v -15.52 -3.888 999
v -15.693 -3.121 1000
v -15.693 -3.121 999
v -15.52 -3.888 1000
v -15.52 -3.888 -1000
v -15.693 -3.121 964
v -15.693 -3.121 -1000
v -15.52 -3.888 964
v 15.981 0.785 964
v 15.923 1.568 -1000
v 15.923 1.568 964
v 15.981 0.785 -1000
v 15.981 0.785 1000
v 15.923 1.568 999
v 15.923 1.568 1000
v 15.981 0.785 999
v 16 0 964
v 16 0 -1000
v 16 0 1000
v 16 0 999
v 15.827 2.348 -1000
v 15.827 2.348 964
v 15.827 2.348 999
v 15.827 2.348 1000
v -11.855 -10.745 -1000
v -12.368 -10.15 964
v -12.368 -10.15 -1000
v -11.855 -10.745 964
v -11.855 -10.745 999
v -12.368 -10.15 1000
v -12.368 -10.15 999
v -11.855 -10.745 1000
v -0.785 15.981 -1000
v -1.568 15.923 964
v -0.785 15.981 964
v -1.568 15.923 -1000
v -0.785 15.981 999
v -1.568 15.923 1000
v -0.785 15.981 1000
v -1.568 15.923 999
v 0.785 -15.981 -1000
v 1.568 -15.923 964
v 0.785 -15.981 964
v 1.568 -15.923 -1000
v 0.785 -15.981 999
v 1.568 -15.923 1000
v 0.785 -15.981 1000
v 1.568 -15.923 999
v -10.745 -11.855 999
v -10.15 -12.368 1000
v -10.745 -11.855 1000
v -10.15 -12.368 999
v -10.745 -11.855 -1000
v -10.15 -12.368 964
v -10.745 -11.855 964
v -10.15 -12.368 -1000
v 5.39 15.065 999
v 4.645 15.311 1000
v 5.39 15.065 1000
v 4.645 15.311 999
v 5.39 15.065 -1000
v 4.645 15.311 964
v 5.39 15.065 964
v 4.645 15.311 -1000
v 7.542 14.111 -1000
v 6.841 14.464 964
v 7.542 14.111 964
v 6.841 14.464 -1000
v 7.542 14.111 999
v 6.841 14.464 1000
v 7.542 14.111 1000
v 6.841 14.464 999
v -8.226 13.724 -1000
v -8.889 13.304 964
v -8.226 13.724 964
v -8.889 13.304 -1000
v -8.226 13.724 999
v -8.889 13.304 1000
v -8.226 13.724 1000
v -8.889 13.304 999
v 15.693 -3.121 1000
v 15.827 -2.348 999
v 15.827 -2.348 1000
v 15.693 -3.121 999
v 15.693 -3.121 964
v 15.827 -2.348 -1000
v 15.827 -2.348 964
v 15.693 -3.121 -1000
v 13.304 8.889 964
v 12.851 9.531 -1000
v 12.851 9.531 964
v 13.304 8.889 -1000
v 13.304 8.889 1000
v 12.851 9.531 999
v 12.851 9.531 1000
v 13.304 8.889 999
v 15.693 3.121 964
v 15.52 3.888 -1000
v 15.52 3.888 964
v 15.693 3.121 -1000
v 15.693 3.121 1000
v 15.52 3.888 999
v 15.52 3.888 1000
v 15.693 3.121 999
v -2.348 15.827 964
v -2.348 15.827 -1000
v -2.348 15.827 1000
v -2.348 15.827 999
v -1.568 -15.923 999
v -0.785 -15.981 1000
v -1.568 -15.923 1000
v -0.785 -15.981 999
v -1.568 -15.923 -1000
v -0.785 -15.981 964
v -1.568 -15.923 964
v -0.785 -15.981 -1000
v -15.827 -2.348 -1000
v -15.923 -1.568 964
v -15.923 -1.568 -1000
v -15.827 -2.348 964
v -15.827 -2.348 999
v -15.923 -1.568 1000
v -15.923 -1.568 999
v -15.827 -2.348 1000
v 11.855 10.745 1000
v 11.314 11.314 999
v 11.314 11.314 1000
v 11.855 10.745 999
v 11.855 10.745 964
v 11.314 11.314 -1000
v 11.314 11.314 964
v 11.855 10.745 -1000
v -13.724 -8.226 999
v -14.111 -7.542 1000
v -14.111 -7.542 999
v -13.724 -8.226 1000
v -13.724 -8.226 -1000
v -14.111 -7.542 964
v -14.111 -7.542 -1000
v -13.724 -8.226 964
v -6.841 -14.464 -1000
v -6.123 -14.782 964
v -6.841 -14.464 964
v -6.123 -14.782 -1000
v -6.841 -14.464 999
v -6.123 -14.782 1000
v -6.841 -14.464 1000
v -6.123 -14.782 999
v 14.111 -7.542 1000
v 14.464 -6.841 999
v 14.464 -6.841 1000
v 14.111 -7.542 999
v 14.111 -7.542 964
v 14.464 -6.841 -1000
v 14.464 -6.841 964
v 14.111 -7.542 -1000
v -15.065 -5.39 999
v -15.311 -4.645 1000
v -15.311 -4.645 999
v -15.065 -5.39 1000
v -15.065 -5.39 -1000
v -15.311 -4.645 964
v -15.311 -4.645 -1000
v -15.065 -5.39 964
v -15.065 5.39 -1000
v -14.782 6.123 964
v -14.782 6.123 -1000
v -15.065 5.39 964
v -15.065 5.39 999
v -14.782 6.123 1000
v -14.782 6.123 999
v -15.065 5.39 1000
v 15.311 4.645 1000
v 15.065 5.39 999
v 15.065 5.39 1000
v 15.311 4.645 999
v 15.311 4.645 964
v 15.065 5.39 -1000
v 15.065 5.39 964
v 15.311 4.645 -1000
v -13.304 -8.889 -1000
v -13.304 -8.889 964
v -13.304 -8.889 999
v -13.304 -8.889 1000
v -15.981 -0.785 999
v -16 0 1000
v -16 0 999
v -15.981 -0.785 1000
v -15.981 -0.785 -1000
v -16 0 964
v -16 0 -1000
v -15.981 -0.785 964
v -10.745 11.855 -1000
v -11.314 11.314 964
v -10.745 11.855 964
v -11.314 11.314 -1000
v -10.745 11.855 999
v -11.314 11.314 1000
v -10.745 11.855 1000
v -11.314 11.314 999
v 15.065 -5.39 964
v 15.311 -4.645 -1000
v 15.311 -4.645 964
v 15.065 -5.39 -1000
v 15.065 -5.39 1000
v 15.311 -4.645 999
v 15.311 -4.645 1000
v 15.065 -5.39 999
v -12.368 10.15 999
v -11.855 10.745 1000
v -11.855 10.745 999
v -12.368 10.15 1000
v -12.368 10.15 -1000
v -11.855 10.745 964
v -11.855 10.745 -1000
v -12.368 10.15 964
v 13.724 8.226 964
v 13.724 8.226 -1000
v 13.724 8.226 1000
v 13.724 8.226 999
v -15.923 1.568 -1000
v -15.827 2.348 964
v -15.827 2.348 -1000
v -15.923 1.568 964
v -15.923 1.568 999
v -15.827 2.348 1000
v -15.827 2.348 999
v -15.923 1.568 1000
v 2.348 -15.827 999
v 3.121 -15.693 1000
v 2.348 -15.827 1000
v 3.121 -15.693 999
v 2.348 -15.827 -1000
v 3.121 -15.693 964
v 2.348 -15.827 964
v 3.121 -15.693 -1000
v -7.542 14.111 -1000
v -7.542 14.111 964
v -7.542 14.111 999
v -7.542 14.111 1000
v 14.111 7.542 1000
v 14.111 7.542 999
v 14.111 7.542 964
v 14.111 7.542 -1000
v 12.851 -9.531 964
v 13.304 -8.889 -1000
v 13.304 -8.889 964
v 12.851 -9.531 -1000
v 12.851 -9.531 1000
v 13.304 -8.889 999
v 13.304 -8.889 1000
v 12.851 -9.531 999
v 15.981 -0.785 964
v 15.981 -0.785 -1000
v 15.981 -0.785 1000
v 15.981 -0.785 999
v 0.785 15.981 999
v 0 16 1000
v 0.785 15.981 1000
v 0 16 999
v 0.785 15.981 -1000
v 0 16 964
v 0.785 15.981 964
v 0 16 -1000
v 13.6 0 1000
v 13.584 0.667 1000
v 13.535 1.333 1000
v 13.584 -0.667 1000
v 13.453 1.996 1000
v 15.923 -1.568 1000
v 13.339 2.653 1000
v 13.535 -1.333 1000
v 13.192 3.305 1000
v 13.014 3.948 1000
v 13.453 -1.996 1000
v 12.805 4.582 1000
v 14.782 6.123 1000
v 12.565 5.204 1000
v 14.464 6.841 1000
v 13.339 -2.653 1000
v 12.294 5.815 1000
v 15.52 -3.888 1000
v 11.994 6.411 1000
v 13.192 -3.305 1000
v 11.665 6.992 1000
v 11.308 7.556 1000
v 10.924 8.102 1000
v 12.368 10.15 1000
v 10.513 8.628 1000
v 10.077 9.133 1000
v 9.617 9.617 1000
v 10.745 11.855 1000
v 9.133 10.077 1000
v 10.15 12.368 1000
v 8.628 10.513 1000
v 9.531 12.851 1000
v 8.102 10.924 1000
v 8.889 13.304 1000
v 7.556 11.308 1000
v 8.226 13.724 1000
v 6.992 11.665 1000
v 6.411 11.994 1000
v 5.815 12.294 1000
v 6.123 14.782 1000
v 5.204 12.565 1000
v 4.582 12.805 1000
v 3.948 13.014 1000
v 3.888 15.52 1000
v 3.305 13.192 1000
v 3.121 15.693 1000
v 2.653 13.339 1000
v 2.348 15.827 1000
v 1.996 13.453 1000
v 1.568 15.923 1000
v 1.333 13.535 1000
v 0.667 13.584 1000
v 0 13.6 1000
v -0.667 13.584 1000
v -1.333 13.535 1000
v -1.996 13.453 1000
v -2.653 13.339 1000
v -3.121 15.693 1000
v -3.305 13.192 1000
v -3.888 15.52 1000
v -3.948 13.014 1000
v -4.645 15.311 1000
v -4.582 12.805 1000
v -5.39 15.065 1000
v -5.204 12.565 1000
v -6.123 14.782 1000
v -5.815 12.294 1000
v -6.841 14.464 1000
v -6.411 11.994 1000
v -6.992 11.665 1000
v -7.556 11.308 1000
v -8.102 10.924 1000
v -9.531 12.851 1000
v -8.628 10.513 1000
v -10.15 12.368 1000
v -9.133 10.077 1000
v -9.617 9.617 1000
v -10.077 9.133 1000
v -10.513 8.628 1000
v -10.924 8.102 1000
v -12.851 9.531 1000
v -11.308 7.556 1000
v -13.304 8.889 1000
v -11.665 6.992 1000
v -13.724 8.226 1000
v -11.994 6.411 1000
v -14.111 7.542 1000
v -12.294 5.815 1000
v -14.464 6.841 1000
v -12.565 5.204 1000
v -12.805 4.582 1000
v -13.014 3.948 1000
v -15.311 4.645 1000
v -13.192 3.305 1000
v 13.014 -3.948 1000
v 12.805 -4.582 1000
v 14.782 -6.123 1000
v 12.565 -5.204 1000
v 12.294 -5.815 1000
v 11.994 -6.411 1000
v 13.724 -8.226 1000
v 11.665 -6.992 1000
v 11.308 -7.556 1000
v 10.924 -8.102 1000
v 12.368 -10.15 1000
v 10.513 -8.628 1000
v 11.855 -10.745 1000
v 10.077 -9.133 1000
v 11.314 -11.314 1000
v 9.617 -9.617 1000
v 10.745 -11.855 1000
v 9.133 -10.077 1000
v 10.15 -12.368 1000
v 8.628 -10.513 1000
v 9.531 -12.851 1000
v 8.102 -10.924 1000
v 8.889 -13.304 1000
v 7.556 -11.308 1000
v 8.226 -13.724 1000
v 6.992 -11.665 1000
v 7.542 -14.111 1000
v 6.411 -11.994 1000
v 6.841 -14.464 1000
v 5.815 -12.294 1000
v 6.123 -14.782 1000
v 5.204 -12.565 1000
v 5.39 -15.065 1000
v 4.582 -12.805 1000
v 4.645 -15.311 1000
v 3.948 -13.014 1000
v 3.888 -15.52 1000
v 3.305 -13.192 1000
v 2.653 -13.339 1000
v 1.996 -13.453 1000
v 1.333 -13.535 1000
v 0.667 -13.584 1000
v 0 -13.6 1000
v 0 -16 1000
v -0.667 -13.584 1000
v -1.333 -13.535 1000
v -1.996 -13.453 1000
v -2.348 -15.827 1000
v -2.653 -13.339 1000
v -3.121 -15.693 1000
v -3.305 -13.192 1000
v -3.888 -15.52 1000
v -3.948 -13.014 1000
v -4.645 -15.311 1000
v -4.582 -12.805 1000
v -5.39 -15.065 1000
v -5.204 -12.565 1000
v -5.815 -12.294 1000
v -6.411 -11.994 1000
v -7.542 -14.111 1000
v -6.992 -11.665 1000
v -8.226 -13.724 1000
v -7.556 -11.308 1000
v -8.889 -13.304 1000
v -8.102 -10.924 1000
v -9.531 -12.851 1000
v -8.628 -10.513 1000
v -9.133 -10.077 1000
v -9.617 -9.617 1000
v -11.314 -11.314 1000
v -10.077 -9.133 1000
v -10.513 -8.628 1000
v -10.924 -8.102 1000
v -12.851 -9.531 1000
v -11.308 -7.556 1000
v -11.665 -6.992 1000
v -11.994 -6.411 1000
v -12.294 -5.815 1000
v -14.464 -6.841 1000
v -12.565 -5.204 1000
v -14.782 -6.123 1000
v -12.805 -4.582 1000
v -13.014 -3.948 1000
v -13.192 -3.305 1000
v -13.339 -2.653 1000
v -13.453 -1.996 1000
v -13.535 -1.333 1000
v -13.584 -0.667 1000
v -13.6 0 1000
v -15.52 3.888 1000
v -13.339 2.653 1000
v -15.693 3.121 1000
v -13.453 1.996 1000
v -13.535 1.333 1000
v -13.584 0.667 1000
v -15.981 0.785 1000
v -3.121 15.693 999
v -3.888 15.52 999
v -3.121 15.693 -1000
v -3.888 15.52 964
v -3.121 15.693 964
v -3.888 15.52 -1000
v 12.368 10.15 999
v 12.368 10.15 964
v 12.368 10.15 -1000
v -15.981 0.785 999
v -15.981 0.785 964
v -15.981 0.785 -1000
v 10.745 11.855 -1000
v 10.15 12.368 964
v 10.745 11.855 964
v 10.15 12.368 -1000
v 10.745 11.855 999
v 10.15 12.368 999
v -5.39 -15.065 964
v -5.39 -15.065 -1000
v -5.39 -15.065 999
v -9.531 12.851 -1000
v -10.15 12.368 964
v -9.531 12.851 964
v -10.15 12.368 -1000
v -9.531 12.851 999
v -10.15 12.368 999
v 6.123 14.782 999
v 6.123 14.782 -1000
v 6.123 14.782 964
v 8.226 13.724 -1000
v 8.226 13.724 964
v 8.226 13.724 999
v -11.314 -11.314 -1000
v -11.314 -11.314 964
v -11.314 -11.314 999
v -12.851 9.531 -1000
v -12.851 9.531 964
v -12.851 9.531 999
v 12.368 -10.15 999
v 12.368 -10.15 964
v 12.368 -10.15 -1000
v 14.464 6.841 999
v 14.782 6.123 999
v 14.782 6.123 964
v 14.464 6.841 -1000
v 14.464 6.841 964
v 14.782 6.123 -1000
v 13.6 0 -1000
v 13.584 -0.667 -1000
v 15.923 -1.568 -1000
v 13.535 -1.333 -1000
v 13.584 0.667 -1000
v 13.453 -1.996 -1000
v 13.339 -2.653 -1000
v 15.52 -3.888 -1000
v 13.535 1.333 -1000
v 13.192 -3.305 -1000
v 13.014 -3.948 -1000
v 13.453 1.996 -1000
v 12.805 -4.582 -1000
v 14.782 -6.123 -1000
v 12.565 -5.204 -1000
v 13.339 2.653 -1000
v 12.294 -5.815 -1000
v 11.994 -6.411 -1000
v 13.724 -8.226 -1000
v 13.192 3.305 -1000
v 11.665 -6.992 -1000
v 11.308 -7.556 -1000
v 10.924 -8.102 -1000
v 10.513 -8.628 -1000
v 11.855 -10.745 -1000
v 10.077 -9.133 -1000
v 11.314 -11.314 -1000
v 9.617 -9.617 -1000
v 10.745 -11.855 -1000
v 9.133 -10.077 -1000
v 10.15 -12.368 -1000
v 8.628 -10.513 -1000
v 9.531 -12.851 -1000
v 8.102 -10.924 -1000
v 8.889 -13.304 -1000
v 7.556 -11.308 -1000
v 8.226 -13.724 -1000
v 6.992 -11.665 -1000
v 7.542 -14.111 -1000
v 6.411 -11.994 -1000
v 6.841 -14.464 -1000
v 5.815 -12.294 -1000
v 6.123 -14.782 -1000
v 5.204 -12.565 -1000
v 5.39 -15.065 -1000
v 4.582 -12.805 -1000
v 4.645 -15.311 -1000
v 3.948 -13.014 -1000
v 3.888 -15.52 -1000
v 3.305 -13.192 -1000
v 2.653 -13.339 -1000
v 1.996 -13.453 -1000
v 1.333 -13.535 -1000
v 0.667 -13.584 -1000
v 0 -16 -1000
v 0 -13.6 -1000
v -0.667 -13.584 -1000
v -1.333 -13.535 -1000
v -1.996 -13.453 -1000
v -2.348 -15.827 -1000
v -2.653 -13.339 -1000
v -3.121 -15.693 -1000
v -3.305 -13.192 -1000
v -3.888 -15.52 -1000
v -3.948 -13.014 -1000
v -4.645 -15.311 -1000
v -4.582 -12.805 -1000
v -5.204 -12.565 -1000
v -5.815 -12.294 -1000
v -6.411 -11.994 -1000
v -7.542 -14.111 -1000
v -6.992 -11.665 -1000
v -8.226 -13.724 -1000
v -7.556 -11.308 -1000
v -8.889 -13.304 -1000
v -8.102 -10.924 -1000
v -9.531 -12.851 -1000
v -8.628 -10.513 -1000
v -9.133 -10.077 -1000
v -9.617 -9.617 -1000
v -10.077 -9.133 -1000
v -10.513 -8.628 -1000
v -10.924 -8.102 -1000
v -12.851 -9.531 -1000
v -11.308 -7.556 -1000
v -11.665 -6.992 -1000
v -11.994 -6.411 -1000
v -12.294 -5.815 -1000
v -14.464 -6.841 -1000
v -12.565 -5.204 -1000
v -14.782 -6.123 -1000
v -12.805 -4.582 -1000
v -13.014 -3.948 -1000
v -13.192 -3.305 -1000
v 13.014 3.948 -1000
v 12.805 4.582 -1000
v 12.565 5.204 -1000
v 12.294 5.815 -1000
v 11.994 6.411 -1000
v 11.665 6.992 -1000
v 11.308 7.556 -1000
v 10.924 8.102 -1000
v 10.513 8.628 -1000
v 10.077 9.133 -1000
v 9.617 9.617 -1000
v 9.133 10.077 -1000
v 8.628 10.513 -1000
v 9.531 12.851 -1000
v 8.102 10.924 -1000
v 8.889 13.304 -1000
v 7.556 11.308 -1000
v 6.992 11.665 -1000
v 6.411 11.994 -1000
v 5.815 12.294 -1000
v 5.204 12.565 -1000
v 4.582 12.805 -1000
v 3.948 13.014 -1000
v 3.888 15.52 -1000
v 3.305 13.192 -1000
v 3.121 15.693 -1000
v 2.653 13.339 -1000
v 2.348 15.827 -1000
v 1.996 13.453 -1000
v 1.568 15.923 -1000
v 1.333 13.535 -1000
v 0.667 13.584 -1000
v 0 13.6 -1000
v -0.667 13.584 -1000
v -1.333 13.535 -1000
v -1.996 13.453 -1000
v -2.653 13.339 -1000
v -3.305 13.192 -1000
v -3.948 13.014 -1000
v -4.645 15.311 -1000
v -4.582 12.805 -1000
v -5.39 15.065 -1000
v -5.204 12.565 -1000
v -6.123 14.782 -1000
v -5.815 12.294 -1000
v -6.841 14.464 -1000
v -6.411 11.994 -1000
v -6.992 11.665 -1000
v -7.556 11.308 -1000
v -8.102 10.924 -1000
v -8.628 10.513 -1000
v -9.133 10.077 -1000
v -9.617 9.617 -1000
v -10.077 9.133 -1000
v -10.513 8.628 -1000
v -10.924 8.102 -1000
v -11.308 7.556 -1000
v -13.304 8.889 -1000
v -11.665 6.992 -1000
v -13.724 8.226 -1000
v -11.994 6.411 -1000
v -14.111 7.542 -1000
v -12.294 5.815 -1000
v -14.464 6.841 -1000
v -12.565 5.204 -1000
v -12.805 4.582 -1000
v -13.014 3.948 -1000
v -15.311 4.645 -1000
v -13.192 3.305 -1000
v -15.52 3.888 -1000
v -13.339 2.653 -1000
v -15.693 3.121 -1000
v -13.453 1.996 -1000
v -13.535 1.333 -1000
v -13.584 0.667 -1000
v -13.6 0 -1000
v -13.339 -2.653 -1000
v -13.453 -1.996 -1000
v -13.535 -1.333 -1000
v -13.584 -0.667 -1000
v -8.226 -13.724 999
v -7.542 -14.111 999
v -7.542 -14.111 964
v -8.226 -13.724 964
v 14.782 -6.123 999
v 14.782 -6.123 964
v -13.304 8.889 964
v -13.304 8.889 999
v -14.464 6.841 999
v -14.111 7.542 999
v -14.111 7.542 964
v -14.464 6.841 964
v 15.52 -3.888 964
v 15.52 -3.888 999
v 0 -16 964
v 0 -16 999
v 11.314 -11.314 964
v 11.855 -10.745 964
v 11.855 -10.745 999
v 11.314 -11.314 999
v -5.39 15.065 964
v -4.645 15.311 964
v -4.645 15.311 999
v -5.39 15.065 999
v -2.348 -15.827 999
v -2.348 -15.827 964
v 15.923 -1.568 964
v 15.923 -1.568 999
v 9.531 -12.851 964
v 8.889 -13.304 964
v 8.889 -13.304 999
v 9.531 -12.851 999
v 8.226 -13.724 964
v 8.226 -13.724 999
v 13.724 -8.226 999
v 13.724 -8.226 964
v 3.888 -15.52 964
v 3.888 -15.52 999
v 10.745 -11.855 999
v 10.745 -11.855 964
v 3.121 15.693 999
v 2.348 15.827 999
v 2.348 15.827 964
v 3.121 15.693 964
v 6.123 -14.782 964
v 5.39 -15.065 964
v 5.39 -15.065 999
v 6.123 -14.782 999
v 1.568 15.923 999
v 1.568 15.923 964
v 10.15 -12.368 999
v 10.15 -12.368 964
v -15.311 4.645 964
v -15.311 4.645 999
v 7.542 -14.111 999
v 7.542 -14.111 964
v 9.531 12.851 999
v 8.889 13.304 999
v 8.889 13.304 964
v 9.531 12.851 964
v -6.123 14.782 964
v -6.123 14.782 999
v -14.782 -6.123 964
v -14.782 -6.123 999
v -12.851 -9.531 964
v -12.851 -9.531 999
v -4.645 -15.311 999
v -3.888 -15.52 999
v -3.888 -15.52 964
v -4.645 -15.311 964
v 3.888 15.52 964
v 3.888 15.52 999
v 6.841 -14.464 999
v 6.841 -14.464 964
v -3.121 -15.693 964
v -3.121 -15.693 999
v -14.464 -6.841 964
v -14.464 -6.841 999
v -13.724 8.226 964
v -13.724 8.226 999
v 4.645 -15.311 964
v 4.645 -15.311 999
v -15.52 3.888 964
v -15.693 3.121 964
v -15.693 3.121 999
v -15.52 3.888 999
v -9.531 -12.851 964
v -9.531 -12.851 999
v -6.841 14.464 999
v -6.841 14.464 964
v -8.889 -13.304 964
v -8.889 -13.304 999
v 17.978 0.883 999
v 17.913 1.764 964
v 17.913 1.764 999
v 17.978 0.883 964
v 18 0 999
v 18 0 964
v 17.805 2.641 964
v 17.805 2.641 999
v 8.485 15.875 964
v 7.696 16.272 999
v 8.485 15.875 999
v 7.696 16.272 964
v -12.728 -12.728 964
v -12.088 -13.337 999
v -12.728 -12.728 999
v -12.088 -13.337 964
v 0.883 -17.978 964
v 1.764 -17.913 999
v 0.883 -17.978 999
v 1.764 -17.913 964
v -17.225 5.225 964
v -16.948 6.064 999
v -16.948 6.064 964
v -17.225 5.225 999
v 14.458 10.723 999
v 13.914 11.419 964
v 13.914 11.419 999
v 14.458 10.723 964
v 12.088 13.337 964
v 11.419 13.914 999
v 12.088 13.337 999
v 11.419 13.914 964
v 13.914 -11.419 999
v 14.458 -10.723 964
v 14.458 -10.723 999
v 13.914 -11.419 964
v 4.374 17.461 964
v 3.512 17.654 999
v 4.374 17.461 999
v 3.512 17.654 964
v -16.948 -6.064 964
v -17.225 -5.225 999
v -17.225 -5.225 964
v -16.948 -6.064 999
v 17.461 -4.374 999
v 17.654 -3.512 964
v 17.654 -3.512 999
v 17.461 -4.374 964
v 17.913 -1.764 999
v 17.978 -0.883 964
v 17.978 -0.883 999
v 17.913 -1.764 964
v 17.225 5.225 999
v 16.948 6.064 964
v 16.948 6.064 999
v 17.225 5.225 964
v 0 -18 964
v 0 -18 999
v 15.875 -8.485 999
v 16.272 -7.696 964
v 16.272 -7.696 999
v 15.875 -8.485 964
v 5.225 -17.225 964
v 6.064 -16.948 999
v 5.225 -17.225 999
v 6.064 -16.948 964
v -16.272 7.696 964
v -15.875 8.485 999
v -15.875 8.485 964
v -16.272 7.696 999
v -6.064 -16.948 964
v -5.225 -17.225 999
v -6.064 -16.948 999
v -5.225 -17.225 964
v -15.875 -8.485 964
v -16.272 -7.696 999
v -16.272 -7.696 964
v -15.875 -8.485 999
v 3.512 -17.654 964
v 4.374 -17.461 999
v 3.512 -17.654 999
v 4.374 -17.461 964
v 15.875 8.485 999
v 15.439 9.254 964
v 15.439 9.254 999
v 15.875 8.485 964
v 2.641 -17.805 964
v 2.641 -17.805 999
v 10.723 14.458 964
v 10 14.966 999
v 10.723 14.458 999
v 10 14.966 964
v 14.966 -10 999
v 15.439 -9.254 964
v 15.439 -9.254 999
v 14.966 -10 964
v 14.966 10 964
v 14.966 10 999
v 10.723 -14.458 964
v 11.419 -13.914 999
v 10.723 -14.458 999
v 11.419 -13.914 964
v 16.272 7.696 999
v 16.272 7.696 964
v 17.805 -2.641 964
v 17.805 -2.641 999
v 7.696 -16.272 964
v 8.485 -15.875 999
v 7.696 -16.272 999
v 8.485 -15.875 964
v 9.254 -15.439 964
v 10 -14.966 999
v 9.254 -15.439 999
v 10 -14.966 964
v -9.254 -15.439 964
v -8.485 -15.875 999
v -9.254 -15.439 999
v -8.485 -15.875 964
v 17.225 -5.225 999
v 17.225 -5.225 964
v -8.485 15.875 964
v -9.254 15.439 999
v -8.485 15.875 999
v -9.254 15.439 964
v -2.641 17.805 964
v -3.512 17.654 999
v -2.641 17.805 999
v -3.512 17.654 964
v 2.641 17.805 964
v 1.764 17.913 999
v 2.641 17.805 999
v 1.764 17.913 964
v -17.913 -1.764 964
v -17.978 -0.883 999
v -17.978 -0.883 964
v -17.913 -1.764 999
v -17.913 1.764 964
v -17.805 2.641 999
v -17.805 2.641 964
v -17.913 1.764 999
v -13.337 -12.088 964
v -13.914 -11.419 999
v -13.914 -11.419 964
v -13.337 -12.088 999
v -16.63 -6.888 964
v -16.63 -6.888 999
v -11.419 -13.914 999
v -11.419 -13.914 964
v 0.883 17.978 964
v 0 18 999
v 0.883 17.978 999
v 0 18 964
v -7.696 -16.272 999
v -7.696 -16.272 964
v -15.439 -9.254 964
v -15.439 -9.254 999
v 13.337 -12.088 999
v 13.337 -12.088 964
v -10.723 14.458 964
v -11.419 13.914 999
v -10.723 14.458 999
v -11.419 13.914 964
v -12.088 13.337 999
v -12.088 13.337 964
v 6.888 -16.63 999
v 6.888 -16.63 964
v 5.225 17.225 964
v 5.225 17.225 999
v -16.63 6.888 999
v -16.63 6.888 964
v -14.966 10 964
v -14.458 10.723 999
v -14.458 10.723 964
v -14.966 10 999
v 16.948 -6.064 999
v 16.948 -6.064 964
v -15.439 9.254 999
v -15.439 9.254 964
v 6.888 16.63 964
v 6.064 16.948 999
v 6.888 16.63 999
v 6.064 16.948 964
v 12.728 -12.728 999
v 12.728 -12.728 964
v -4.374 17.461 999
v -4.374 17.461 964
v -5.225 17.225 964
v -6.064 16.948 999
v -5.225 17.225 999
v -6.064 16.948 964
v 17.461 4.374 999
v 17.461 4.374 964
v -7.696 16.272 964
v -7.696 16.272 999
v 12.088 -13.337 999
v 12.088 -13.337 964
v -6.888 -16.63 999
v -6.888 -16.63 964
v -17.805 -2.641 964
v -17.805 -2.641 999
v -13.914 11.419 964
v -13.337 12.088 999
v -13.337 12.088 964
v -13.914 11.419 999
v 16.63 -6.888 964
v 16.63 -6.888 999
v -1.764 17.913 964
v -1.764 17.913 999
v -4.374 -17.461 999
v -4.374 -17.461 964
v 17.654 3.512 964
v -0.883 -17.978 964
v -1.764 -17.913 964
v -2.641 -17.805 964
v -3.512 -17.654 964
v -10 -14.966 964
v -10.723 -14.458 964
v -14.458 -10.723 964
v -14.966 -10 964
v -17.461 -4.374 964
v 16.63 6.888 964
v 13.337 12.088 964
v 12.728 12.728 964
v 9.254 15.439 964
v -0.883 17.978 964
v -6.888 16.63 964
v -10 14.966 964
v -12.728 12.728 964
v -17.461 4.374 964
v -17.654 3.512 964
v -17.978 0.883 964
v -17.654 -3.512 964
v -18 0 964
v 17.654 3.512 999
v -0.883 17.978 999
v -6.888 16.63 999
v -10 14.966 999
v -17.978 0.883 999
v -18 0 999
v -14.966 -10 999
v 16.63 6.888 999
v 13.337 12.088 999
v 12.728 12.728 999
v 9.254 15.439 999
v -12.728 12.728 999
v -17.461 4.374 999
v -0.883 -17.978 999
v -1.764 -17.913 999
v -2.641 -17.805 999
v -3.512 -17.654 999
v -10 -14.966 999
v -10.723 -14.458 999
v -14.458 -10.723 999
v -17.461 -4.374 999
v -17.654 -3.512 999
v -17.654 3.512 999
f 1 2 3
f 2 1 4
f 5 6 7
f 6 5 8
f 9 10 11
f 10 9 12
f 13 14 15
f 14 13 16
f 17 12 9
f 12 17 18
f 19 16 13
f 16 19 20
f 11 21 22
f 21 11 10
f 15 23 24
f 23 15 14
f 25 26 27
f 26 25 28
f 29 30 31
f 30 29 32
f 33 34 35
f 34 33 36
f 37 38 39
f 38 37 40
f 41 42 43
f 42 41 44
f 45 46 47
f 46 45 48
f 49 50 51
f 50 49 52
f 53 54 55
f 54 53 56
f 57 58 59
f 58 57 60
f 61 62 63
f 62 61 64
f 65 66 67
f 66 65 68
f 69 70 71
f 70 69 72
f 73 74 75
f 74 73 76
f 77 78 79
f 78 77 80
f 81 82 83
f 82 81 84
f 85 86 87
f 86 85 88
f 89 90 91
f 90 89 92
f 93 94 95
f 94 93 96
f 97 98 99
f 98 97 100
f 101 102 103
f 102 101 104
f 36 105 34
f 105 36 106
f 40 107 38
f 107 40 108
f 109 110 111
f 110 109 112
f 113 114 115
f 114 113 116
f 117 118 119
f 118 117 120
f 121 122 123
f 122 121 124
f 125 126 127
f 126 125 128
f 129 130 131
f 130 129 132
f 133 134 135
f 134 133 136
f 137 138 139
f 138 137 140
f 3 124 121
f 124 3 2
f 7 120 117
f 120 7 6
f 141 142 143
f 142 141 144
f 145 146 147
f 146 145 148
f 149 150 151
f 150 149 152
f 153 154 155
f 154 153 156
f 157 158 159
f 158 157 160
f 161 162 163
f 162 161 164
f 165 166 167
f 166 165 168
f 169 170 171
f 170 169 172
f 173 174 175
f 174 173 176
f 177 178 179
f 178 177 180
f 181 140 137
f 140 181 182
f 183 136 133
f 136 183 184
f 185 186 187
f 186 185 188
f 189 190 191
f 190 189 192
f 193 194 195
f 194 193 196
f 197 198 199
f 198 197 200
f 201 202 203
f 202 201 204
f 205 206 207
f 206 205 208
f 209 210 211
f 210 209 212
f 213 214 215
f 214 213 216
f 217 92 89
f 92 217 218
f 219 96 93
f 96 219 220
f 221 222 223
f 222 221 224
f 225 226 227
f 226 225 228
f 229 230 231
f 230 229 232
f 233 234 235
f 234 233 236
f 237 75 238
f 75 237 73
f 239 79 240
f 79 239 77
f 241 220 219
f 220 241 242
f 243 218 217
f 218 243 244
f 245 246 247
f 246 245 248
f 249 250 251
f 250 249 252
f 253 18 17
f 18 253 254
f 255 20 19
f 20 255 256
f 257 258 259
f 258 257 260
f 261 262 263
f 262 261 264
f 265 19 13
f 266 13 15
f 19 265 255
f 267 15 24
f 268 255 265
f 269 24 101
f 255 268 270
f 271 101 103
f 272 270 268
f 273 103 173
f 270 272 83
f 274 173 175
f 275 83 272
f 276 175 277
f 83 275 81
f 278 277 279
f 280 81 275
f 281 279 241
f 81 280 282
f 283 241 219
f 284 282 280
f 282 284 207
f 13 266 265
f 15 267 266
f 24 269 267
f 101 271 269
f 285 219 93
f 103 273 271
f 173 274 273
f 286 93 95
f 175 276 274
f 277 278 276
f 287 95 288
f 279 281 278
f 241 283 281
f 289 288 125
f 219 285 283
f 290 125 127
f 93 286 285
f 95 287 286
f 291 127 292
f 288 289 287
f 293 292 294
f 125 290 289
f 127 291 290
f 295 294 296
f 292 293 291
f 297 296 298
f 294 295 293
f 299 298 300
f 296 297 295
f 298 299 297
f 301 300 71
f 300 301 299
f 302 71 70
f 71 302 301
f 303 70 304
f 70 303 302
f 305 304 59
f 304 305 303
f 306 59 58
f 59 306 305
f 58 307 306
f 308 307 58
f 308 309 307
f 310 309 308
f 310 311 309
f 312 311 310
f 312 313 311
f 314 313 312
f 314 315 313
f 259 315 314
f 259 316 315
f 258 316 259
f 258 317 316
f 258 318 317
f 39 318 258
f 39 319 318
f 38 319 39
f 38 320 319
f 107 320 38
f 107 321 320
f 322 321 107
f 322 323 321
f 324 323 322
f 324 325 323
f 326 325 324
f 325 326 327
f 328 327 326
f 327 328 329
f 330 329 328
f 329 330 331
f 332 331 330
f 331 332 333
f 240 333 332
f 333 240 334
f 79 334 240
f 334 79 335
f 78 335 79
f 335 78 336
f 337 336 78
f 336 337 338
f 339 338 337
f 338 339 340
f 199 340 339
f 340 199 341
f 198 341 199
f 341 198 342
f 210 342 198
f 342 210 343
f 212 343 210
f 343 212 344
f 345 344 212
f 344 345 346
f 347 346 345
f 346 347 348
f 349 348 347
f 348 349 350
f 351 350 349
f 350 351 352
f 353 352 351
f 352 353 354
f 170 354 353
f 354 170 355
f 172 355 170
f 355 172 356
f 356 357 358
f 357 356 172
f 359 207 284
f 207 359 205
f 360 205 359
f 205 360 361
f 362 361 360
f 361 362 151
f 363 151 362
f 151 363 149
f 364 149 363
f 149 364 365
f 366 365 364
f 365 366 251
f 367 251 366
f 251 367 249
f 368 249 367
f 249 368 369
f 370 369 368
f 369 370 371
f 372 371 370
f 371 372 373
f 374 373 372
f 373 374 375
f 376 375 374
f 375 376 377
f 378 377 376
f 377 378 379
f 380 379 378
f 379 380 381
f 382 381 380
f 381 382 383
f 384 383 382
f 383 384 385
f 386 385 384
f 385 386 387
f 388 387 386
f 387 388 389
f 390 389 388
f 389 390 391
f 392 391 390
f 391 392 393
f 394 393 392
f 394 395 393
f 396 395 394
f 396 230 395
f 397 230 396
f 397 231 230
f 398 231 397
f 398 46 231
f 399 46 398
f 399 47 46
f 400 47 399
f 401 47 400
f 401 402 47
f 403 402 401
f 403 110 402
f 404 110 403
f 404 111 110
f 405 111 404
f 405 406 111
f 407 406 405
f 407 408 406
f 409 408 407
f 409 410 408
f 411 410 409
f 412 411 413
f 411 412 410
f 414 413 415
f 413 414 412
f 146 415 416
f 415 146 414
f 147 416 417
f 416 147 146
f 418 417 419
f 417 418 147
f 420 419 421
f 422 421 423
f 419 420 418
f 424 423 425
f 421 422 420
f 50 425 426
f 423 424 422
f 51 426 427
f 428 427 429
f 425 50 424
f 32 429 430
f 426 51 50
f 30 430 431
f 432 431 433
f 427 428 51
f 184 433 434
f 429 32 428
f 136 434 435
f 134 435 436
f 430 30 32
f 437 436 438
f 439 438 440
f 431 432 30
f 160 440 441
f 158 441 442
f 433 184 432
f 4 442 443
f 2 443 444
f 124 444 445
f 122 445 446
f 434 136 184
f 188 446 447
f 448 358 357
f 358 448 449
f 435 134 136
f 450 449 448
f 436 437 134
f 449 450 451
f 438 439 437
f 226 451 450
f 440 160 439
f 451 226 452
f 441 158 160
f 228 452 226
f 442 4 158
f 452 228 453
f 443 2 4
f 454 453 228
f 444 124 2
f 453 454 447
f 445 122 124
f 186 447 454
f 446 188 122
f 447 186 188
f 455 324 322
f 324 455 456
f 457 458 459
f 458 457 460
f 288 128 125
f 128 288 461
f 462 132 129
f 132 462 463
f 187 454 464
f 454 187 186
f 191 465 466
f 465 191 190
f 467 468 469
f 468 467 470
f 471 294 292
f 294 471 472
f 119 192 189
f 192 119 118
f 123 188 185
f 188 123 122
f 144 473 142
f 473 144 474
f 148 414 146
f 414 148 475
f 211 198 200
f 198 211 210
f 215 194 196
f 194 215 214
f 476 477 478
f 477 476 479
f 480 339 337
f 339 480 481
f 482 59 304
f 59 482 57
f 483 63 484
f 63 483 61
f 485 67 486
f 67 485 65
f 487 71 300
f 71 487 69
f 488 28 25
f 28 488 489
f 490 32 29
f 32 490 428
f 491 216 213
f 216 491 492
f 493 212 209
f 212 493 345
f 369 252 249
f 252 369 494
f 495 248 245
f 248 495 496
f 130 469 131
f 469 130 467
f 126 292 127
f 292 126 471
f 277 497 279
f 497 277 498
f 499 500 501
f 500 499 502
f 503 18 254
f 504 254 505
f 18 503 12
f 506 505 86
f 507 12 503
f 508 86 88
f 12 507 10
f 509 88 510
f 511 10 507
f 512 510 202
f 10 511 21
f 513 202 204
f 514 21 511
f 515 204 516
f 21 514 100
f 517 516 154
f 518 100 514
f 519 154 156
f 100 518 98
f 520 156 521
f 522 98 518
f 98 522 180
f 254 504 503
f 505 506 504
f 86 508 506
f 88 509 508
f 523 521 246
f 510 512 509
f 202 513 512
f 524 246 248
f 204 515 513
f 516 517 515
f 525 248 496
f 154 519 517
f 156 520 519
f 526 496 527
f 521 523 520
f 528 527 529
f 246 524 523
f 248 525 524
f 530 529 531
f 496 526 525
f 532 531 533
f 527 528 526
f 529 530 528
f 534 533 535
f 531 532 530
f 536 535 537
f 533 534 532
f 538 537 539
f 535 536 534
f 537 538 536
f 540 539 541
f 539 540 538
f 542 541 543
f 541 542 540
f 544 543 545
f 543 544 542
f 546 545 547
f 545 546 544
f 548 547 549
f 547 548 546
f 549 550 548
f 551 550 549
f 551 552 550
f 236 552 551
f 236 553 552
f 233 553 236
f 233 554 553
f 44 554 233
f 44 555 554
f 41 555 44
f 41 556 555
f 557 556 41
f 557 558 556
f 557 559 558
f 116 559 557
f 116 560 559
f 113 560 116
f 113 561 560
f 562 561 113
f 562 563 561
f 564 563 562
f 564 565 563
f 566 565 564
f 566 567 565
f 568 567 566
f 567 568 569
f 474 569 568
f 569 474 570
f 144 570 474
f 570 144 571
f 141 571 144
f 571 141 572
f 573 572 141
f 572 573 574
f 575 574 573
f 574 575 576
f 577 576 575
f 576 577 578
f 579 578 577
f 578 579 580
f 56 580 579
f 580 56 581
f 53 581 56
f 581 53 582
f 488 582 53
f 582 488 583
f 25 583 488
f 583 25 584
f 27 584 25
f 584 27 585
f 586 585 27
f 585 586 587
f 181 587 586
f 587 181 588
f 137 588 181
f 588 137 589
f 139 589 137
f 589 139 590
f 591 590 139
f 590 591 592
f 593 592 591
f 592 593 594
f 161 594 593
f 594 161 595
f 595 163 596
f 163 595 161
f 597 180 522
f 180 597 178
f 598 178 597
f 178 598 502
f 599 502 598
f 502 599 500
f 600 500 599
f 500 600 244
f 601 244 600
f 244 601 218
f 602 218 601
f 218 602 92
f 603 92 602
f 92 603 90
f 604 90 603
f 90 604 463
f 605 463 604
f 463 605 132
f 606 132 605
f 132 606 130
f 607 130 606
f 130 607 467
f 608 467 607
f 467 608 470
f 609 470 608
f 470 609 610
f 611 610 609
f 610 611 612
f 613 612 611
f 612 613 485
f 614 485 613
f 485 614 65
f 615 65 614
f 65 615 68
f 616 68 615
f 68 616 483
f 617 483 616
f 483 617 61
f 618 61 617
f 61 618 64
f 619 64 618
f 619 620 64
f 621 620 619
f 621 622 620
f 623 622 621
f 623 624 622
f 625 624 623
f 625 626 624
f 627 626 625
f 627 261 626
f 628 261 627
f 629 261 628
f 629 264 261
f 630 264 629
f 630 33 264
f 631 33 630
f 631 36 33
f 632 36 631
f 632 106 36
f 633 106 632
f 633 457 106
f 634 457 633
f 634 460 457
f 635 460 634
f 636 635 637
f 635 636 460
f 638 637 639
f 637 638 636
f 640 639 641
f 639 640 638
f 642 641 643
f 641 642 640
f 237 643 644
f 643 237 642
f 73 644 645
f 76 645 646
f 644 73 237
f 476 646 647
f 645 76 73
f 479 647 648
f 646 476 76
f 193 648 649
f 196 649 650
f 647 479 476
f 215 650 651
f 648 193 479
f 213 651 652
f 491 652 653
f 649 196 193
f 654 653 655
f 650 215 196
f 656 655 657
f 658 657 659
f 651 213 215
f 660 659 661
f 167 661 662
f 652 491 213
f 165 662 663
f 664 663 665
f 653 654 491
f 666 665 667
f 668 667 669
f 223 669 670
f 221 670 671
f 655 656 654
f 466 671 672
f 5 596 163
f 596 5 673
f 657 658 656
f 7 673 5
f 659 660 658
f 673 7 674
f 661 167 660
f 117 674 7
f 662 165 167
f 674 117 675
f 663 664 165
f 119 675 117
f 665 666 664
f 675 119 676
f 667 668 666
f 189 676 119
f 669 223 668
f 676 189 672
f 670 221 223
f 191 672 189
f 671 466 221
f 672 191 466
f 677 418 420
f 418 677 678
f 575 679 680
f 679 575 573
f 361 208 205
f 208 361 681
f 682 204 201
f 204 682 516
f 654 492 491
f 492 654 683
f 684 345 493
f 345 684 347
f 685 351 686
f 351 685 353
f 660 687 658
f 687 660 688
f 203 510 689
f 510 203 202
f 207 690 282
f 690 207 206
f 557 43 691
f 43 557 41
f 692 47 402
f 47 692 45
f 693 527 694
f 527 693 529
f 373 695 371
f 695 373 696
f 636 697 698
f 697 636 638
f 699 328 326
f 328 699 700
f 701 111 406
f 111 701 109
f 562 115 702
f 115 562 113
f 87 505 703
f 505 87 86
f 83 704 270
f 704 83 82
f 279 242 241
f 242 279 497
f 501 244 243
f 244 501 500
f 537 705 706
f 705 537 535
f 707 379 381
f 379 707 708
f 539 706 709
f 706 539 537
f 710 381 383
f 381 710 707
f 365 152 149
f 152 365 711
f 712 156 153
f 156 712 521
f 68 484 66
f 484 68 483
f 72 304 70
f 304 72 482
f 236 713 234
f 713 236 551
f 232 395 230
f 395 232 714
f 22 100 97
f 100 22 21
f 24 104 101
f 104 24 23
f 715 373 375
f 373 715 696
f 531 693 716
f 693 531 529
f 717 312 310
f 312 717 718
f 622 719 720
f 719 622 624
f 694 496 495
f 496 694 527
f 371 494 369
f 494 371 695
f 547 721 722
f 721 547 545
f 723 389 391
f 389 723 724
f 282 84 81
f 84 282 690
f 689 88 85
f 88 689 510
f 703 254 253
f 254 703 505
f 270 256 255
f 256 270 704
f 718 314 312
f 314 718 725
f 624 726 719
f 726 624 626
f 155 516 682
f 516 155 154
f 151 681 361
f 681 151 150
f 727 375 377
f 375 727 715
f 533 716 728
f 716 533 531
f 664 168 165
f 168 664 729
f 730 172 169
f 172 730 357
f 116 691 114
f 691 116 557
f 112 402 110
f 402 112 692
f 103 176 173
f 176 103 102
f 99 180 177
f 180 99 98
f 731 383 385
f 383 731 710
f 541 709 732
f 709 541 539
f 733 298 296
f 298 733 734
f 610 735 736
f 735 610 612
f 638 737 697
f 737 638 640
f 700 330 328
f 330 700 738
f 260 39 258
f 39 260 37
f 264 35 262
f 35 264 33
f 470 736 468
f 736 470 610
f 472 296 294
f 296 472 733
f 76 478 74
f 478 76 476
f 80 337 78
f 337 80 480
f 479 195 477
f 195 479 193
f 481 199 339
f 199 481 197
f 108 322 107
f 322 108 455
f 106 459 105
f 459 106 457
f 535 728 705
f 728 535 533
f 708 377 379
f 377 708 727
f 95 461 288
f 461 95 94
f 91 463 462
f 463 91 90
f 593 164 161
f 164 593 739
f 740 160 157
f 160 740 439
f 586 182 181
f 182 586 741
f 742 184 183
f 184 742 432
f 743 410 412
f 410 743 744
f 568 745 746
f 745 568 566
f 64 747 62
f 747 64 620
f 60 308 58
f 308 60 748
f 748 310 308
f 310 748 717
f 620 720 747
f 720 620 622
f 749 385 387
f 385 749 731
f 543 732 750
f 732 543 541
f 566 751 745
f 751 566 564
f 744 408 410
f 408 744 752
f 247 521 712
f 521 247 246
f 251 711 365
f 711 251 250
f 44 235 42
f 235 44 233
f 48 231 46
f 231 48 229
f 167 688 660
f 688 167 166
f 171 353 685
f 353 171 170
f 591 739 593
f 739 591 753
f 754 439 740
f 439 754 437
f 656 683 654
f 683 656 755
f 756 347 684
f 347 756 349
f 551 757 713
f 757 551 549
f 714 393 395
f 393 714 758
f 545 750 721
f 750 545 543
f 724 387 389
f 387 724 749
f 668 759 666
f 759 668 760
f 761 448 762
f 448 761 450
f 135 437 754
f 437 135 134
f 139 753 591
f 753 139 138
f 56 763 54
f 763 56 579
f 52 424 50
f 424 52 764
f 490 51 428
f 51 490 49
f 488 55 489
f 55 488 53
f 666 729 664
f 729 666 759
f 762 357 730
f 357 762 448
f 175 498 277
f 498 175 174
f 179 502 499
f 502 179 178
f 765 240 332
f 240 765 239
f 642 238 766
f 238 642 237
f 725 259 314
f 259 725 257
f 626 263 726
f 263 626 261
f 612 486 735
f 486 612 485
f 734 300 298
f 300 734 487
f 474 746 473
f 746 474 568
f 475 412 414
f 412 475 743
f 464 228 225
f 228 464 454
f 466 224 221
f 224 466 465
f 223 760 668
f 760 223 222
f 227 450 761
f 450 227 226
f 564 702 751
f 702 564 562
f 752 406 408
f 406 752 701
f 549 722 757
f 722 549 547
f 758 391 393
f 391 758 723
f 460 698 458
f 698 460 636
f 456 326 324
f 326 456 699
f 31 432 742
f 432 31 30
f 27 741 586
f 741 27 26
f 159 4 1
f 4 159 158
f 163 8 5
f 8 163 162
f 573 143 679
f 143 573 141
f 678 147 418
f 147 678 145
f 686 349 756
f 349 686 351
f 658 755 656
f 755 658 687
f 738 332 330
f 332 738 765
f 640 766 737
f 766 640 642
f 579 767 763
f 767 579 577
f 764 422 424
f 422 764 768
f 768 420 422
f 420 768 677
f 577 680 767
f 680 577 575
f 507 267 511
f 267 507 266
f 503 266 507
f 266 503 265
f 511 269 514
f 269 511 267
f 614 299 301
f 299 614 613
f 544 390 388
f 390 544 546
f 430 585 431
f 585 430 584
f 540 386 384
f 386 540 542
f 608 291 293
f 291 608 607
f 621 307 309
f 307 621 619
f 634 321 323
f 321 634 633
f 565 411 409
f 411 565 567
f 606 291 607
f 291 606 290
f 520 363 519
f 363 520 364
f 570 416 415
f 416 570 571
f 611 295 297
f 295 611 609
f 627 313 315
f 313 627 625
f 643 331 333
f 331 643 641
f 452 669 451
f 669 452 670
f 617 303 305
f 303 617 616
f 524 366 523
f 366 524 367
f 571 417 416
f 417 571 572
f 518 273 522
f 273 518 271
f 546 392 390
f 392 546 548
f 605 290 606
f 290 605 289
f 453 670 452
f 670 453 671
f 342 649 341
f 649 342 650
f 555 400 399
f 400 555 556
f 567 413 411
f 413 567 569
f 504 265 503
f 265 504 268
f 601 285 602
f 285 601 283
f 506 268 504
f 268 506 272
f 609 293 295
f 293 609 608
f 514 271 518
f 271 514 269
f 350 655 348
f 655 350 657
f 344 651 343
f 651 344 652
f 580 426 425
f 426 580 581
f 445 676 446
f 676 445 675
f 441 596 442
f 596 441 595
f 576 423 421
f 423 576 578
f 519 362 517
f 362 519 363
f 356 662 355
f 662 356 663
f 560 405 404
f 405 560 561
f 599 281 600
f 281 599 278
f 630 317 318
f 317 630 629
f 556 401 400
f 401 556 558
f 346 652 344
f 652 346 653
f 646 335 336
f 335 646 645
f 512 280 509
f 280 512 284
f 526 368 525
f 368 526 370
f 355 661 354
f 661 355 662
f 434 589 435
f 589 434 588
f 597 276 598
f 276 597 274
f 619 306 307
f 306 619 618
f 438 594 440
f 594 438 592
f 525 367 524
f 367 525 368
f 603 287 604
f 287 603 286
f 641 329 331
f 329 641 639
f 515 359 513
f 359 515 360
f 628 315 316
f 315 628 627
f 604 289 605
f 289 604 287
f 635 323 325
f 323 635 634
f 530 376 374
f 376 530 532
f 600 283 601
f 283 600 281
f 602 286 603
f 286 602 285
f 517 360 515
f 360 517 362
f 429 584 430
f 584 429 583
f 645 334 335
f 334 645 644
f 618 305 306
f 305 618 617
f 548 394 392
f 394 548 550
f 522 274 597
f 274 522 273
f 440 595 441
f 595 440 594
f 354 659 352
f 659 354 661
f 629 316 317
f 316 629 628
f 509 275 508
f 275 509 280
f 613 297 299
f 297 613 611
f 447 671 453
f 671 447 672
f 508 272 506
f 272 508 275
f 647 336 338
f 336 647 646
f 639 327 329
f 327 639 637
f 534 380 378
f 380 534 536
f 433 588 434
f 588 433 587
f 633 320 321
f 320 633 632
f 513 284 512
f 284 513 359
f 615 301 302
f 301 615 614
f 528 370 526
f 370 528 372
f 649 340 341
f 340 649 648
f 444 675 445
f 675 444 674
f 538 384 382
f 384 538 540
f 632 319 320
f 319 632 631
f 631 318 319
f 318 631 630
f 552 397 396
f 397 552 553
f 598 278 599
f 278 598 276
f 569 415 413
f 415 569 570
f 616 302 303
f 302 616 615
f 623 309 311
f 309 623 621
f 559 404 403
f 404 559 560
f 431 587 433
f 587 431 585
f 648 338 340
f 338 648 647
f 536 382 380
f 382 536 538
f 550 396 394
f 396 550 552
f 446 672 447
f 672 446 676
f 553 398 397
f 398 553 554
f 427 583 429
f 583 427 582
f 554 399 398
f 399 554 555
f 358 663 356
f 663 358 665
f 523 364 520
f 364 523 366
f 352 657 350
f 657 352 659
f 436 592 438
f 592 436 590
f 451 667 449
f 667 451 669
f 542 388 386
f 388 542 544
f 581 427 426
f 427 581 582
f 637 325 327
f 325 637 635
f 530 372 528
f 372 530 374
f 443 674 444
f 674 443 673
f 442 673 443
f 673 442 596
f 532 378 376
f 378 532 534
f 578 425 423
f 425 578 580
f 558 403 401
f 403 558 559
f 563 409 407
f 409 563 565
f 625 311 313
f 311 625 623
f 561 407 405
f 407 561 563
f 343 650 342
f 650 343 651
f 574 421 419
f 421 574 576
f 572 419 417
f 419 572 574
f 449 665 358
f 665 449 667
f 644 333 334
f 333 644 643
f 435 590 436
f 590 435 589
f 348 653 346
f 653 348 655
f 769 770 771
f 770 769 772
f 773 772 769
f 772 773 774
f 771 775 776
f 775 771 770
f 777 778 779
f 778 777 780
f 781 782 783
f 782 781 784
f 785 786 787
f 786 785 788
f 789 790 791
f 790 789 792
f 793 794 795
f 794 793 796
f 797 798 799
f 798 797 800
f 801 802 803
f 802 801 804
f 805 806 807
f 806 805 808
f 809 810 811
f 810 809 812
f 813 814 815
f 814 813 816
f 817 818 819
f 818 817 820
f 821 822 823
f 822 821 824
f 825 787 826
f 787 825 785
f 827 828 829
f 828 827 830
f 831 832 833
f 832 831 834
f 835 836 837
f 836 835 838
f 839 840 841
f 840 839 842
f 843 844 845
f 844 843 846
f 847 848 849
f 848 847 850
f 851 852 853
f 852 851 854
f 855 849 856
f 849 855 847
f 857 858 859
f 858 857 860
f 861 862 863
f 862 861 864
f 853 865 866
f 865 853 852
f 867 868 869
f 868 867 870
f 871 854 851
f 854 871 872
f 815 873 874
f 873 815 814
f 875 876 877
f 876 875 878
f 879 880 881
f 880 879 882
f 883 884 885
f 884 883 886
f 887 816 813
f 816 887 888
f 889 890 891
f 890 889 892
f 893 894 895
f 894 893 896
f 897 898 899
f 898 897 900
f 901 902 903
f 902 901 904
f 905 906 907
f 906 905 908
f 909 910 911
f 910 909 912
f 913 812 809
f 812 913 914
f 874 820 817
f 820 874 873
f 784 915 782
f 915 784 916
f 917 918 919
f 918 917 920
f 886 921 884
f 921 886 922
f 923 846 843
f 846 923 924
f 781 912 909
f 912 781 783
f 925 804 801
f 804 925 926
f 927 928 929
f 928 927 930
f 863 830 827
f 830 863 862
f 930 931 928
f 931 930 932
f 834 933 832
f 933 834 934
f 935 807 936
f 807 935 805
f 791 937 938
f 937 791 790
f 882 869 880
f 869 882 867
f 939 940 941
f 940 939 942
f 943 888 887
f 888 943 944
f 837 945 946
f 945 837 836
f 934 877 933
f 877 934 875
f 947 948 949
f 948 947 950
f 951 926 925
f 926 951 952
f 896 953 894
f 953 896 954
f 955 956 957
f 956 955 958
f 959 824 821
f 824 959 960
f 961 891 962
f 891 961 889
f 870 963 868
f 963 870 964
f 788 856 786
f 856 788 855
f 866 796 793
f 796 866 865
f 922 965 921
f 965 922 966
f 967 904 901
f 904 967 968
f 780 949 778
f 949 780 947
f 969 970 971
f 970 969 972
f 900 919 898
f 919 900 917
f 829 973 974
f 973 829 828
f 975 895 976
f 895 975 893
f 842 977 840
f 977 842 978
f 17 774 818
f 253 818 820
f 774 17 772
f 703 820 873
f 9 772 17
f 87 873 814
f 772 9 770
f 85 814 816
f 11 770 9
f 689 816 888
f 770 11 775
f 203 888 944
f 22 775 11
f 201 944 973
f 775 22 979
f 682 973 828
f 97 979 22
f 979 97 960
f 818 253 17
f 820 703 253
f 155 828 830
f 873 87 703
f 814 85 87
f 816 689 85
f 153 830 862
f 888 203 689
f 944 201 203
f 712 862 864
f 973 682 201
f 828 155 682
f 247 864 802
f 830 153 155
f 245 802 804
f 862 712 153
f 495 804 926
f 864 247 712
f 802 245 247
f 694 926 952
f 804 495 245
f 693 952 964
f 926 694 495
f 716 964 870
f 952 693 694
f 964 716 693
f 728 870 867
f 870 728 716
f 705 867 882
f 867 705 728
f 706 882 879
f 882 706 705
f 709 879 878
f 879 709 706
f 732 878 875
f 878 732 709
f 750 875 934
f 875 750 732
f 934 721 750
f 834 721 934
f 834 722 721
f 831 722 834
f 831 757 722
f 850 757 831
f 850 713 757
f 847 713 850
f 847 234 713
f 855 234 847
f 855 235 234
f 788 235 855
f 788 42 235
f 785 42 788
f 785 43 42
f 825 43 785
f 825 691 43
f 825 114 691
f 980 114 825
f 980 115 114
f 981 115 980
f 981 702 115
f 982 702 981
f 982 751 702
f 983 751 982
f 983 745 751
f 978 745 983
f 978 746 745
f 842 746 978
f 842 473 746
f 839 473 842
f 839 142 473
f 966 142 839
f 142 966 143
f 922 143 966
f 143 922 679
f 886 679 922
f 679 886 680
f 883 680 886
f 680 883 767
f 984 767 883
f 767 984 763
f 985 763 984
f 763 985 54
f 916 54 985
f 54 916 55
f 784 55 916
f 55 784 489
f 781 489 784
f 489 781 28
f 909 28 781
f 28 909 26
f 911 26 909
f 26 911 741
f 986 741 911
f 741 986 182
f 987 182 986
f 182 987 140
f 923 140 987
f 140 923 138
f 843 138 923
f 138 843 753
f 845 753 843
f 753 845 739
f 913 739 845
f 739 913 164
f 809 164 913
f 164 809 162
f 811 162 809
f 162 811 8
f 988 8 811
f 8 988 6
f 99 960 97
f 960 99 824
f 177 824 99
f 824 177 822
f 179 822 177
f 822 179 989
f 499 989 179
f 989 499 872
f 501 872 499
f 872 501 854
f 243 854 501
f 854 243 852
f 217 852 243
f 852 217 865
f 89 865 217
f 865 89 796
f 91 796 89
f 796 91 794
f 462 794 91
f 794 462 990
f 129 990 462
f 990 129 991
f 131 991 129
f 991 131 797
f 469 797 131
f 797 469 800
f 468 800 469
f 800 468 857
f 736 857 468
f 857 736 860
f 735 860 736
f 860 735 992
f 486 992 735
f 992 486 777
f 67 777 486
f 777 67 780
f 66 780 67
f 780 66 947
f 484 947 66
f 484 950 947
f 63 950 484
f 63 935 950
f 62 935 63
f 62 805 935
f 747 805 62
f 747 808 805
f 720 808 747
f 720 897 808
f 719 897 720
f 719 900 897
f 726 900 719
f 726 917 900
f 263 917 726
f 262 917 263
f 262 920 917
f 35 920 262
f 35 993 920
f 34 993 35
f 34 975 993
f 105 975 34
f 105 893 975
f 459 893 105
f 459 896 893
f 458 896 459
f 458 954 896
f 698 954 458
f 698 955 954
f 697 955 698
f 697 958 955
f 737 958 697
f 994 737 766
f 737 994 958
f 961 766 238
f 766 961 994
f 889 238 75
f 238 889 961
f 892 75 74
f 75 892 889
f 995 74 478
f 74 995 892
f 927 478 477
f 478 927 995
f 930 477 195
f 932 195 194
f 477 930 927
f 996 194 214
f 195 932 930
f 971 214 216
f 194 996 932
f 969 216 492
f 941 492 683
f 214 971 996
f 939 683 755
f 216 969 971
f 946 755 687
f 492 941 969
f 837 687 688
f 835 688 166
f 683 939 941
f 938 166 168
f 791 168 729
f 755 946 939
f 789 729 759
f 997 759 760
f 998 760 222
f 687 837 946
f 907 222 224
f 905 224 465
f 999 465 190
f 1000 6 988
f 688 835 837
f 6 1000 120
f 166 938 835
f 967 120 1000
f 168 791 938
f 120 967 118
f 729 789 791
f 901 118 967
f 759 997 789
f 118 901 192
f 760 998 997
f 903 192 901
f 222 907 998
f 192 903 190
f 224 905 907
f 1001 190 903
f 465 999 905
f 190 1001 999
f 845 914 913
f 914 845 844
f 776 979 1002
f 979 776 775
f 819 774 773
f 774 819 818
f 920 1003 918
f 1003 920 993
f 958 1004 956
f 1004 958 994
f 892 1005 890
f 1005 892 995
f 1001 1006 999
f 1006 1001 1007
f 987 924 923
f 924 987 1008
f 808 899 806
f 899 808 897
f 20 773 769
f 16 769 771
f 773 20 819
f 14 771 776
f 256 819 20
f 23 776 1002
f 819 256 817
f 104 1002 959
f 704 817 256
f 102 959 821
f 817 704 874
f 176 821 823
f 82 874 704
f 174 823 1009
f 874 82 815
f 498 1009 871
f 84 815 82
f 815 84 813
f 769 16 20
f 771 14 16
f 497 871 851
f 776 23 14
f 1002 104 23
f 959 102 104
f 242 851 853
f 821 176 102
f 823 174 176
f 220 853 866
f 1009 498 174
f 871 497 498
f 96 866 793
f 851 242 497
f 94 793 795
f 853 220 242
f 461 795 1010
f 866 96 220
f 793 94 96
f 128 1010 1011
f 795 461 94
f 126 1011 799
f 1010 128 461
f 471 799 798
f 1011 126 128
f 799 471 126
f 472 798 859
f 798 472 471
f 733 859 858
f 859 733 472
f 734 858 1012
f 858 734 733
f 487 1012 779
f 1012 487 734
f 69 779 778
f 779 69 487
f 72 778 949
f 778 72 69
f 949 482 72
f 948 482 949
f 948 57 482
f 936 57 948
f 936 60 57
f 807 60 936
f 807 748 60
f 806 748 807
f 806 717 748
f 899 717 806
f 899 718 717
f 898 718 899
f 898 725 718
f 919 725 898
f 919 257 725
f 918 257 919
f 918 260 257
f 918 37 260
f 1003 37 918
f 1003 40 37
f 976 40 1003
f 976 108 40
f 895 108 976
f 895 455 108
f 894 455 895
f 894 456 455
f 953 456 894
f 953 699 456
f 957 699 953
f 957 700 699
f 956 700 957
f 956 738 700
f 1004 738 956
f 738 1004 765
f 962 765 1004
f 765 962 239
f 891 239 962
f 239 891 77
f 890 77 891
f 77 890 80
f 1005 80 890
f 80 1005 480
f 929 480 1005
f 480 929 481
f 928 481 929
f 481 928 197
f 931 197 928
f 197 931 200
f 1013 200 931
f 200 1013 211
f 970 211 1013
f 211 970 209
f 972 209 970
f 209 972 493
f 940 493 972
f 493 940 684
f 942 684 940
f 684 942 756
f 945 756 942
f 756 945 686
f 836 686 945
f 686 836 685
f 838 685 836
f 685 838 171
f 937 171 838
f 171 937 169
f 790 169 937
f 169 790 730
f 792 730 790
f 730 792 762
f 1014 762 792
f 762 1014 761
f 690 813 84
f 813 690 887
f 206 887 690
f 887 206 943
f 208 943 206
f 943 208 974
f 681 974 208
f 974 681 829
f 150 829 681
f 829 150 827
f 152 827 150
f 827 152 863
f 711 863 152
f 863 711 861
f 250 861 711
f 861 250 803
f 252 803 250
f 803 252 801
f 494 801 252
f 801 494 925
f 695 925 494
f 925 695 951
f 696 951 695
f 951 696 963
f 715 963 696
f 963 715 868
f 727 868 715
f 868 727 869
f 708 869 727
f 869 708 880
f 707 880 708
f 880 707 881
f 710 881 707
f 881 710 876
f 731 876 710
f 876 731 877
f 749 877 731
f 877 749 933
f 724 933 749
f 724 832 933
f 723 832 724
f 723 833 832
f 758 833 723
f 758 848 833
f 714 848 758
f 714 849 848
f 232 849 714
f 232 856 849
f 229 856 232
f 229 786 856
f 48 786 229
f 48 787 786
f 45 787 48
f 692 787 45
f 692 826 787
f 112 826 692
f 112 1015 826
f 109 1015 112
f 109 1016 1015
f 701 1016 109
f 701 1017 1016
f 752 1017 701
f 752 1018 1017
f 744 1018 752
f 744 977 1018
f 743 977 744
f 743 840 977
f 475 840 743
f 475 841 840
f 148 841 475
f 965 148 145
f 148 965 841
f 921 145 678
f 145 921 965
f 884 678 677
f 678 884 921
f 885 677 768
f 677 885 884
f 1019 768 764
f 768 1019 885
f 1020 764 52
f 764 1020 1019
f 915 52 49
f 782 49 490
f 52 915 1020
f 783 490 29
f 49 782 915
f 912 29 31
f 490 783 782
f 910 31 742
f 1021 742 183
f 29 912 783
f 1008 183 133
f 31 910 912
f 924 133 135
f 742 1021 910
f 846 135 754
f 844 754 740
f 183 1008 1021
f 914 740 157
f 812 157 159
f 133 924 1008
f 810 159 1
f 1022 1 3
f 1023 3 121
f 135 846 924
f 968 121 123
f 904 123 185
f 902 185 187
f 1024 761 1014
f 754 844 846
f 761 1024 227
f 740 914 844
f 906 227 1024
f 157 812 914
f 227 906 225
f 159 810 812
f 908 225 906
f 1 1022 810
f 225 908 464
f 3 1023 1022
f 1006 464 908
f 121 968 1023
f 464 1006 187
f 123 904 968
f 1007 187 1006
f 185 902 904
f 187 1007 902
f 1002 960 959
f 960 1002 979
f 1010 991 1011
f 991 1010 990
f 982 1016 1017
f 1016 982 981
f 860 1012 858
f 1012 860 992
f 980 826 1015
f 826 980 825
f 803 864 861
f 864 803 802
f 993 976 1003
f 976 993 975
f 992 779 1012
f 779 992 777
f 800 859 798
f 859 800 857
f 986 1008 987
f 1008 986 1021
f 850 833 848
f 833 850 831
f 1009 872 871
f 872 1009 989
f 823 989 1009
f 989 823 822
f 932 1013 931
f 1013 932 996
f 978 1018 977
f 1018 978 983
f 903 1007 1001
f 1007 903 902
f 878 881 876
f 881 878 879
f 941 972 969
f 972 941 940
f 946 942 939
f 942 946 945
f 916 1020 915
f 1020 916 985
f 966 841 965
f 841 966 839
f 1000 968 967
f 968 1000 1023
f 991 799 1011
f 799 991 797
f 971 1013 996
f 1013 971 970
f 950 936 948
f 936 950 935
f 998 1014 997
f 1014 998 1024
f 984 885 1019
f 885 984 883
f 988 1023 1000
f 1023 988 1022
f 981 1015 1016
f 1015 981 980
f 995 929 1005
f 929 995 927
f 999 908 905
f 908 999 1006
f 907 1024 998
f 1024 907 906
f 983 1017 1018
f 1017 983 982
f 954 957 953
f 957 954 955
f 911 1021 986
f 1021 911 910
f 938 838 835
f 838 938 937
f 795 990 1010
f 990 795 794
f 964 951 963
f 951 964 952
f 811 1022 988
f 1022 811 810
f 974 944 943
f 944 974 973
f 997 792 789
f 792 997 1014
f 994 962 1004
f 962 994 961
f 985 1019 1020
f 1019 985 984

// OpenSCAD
// HT 32 pipe 2000 mm (single connected solid)

// Parameters
pipe_od = 32; //[16:64:1]
wall_thickness = 2.4; //[1.2:4.8:0.1]
length_mm = 2000; //[1000:4000:10]
end_fitting_length = 35; //[15:70:1]
end_fitting_radial_add = 2.0; //[0.5:6.0:0.1]
end_fitting_wall = 2.0; //[1.0:5.0:0.1]
connect_overlap = 1.0; //[0.5:2.0:0.1]

$fn = 128;

module ht_pipe() {
    // Derived radii
    ro = pipe_od/2;
    ri = ro - wall_thickness;

    // Fitting radii (socket OD larger, ID slightly smaller than pipe OD)
    fro = ro + end_fitting_radial_add;
    fri = ro - end_fitting_wall;

    // Robustness
    eps = 0.05;
    ri2  = max(0.01, ri);
    fri2 = max(0.01, fri);

    // Ensure overlap is valid and fitting length is positive
    ov = min(connect_overlap, max(0, end_fitting_length - eps));
    fit_len = max(eps, end_fitting_length);

    // Center the whole pipe on Z for predictable ortho views
    translate([0, 0, -length_mm/2])
    color([0.85, 0.85, 0.8])
    union() {
        // Main pipe (hollow)
        difference() {
            cylinder(h=length_mm, r=ro, center=false);
            translate([0, 0, -eps])
                cylinder(h=length_mm + 2*eps, r=ri2, center=false);
        }

        // End fitting (socket) at +Z end, connected with calculated overlap
        // Fitting starts at: length_mm - fit_len - ov
        translate([0, 0, length_mm - fit_len - ov])
        difference() {
            cylinder(h=fit_len, r=fro, center=false);
            translate([0, 0, -eps])
                cylinder(h=fit_len + 2*eps, r=fri2, center=false);
        }
    }
}

ht_pipe();
